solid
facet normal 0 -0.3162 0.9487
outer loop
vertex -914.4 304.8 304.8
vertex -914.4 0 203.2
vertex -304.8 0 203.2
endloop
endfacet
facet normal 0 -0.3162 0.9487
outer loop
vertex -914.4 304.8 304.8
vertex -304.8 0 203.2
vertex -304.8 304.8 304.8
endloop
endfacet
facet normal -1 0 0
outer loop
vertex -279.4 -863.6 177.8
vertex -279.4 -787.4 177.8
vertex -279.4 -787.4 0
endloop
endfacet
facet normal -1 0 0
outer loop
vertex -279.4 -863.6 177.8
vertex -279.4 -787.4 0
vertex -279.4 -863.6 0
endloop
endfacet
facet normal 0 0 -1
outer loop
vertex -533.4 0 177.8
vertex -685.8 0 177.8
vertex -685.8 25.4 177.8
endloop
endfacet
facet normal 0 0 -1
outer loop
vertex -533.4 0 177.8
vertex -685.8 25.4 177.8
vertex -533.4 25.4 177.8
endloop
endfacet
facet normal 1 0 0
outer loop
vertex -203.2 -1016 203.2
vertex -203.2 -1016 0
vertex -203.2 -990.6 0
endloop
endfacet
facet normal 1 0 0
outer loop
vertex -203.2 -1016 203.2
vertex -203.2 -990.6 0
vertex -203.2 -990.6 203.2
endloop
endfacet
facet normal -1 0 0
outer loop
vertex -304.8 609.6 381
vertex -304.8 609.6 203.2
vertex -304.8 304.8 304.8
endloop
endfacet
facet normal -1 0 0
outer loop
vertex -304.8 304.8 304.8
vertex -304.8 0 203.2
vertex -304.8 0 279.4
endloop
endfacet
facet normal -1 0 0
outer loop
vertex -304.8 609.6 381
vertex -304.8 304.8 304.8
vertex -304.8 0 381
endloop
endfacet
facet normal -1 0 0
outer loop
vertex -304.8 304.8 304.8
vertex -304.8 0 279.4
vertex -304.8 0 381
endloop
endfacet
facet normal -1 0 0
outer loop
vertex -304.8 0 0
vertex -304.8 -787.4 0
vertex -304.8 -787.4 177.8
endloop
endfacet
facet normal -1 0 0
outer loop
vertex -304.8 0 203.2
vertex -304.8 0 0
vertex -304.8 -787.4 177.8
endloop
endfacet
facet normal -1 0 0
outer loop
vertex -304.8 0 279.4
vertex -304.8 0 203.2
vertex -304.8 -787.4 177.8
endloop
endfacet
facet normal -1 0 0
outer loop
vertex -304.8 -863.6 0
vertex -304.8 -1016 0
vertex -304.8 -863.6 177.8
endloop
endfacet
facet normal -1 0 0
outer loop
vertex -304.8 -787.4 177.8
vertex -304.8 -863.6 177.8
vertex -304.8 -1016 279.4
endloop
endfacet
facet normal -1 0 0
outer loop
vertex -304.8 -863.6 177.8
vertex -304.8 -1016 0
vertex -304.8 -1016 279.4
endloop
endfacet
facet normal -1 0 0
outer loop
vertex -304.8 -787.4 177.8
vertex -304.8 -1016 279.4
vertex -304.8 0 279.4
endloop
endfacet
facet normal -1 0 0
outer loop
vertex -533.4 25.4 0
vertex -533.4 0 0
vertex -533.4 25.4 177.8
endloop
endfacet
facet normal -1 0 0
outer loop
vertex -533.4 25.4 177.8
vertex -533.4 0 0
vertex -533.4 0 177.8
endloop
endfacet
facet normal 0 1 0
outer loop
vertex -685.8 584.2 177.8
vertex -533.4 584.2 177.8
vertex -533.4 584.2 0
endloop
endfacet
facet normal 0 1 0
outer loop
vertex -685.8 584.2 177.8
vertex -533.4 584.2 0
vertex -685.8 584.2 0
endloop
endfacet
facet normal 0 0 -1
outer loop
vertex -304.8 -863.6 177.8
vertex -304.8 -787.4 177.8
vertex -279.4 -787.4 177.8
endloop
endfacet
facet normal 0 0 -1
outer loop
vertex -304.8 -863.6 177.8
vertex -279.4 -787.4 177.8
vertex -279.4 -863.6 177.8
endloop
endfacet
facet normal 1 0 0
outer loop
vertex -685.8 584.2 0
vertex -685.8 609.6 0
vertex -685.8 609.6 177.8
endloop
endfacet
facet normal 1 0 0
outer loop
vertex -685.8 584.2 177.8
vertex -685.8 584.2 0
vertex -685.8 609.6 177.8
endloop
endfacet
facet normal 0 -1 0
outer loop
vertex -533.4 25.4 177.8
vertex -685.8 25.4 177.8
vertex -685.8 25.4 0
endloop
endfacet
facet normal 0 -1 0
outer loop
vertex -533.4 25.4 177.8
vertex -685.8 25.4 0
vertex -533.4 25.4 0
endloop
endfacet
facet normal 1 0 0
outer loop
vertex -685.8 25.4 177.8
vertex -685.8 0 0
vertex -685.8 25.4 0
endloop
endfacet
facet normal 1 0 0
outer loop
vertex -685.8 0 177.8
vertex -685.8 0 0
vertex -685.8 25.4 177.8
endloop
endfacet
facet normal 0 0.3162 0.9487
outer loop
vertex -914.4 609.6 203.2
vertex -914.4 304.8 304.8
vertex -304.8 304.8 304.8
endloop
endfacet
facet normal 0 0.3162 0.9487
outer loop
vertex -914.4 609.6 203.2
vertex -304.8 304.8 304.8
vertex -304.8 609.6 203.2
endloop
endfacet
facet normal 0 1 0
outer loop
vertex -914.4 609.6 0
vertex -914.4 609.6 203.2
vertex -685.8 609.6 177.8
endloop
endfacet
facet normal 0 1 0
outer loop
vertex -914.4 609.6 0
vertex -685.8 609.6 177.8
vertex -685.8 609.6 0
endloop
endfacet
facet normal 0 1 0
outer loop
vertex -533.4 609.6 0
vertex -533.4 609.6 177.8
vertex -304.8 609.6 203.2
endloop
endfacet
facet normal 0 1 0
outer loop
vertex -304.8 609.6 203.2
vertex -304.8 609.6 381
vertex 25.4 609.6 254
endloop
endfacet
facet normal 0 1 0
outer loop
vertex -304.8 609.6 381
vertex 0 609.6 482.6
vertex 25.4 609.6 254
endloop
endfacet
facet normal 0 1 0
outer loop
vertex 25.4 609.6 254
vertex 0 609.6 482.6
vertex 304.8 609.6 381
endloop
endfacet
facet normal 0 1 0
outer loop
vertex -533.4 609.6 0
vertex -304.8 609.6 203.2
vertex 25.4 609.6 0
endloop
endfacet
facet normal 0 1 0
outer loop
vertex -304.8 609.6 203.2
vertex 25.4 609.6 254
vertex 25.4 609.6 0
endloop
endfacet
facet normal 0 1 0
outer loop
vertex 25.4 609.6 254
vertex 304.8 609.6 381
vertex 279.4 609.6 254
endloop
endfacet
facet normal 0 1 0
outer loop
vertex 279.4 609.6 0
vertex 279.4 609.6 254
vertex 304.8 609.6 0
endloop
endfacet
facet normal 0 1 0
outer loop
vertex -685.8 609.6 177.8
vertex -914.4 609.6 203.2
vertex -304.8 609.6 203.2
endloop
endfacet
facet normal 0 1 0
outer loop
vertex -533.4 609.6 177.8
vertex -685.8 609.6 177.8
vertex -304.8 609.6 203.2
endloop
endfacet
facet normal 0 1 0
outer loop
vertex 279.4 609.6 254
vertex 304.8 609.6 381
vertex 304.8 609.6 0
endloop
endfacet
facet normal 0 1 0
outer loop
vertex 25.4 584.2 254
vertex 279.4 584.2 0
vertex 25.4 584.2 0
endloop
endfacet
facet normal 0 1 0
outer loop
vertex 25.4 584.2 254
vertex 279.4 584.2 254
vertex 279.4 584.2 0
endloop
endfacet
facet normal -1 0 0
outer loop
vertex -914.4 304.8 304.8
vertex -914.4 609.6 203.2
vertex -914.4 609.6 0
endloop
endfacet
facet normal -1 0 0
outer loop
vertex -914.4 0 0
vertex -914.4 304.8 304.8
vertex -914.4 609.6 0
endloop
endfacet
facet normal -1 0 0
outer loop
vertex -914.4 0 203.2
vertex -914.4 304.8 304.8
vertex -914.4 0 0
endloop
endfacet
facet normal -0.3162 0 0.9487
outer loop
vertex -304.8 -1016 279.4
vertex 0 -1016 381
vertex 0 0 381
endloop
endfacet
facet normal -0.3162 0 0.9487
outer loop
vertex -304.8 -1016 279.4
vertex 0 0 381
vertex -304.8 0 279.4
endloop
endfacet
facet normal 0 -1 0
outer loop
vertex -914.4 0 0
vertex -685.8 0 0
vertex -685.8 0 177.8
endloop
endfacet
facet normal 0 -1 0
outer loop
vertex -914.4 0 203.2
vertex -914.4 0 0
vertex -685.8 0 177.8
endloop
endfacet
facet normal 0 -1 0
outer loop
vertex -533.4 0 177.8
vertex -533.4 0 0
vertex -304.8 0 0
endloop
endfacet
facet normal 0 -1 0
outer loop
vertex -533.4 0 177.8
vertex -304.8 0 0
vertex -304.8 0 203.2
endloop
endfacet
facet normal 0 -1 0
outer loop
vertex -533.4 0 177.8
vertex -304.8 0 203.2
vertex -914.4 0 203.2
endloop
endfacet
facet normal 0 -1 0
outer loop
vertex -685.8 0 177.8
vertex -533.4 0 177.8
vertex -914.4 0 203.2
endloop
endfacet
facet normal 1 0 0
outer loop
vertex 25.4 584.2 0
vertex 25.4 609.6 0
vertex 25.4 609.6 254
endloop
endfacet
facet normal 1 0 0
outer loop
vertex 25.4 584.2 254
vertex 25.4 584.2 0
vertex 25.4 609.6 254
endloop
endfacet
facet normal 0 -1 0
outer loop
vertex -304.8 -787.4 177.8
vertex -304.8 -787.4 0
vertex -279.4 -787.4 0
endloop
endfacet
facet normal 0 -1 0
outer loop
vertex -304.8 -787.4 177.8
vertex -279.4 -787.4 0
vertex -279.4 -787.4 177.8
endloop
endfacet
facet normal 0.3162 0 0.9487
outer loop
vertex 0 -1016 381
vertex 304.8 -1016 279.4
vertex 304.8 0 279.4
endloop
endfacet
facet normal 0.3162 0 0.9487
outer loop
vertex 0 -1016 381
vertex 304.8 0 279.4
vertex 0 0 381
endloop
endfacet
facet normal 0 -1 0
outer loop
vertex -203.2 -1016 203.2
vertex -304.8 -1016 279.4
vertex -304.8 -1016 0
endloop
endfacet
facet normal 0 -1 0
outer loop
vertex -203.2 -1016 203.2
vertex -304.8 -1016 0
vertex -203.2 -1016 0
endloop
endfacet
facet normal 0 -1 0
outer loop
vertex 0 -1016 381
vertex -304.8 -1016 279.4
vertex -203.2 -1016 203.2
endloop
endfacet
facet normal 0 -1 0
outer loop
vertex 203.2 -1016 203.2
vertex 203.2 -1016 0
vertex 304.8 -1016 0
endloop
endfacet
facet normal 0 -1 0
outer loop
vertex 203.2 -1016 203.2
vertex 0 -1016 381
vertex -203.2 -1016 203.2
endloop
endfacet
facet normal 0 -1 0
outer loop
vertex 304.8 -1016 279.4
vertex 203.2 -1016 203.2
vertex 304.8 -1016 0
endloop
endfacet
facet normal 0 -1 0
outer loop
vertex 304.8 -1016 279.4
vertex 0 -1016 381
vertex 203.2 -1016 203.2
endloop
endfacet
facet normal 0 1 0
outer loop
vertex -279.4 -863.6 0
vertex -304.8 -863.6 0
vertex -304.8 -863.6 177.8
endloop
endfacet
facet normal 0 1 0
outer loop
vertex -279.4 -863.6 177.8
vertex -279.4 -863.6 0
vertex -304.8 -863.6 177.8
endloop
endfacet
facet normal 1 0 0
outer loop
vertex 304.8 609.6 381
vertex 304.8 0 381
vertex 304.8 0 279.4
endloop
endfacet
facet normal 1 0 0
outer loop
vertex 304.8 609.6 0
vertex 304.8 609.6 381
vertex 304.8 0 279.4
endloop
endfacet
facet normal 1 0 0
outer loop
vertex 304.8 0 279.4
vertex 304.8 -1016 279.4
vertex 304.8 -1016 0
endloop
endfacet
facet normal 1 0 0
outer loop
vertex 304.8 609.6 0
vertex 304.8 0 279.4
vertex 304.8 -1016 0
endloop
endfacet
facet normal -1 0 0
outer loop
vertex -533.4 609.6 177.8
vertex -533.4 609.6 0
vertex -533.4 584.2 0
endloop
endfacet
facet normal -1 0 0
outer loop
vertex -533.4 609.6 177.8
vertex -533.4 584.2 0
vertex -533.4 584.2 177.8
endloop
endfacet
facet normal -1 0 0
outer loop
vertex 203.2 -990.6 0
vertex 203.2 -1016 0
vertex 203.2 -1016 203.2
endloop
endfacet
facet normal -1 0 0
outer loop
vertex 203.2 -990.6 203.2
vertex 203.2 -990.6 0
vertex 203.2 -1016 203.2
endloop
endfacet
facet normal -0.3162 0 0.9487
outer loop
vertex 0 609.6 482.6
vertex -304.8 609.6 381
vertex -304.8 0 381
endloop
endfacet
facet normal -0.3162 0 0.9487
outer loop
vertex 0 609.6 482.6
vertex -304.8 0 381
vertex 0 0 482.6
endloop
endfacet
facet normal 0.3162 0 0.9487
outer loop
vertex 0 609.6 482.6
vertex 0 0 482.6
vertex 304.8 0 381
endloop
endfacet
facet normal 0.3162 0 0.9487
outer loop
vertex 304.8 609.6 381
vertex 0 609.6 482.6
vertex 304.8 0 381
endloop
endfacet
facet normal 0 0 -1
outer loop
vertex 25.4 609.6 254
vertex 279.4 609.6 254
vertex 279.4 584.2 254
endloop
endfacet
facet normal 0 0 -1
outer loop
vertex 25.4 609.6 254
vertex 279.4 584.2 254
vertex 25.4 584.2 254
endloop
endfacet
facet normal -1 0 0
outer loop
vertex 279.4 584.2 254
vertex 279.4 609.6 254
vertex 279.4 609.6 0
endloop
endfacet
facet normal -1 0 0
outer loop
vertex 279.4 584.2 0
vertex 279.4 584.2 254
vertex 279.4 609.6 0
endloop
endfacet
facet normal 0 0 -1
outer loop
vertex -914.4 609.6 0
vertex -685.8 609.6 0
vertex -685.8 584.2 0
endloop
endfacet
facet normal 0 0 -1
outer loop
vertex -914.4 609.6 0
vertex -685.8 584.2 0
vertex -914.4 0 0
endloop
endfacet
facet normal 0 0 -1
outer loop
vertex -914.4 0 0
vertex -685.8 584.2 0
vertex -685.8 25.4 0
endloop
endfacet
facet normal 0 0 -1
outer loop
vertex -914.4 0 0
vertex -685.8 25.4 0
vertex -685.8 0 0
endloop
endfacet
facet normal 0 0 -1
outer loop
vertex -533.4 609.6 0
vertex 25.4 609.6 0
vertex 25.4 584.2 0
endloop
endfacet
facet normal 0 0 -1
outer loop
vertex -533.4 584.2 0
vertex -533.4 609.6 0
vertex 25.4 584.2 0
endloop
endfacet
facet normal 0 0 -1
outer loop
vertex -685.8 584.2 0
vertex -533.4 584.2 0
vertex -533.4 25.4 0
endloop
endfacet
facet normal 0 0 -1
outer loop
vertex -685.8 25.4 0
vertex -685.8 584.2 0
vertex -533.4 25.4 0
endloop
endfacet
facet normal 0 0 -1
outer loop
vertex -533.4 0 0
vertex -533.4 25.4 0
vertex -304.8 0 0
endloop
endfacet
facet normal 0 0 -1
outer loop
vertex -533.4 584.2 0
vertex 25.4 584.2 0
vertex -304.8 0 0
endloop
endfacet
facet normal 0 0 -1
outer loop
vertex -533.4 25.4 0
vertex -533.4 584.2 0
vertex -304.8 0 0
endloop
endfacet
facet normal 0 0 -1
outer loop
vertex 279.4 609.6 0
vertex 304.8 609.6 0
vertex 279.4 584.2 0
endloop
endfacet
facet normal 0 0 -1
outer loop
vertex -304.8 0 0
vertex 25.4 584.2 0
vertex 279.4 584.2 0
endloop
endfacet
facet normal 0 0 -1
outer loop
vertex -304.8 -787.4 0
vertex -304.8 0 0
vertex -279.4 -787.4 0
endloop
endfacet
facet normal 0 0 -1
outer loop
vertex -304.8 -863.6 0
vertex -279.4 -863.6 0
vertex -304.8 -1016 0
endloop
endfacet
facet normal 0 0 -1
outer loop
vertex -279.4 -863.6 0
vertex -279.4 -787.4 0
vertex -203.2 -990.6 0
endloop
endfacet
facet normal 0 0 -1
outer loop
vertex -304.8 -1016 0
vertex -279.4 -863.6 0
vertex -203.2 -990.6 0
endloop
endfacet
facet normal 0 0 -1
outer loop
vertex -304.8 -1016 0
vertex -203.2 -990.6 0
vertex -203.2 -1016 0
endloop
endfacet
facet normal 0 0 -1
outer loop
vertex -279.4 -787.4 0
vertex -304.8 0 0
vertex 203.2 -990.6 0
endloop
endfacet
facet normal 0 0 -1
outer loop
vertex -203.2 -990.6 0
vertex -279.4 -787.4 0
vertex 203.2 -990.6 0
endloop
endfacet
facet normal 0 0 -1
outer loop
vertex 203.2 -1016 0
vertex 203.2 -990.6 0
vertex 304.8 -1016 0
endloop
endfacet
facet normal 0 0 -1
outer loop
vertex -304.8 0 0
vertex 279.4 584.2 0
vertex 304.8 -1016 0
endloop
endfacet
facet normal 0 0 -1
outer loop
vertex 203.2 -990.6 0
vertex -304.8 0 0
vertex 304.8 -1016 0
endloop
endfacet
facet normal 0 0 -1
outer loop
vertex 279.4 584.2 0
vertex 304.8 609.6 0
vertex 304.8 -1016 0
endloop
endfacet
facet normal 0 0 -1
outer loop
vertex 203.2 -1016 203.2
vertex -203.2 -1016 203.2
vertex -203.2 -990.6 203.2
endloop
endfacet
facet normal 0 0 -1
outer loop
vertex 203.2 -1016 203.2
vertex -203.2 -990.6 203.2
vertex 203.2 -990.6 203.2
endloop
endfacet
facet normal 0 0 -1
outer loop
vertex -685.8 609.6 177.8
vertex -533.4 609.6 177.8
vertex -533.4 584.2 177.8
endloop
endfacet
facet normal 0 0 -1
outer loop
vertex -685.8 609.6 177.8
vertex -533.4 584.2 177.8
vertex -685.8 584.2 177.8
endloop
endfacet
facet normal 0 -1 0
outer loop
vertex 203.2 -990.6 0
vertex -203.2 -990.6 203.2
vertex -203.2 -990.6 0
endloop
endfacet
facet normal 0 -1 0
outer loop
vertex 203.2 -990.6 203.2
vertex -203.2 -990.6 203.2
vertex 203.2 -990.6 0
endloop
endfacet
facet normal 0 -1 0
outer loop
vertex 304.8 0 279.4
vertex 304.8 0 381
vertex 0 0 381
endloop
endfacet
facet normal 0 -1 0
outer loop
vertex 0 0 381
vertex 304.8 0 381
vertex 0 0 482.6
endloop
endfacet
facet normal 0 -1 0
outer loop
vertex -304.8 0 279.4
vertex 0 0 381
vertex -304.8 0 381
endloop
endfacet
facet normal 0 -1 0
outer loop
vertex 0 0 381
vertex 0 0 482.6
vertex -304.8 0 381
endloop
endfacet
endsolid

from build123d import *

# Parameters (mm, degrees)
F1_DEPTH  = 1016
F3_DEPTH  = 609.6
F5_DEPTH  = 609.6
F6_W      = 152.4
F6_H      = 177.8
F7_DEPTH  = 25.4
F8_W      = 406.4
F8_H      = 203.2
F9_DEPTH  = 25.4
F10_W     = 254
F10_H     = 203.2
F10_H_2   = 50.8
F10_W_2   = 152.4
F10_H_3   = 177.8
F11_DEPTH = 25.4
F12_W     = 76.2
F12_H     = 177.8
F13_DEPTH = 25.4


with BuildPart() as f1:
    # F0 (on Front) → F1 (new body)
    with BuildSketch(Plane.XZ):
        Polygon((-304.8, 0), (0, 0), (304.8, 0), (304.8, 279.4), (0, 381), (-304.8, 279.4), align=None)
    extrude(amount=F1_DEPTH)

    # F2 (on face) → F3 (join)
    with BuildSketch(Plane(origin=(0, 0, 0), x_dir=(-1, 0, 0), z_dir=(0, 1, 0))):
        Polygon((-304.8, 381), (-304.8, 0), (304.8, 0), (304.8, 381), (0, 482.6), align=None)
    extrude(amount=F3_DEPTH)

    # F4 (on face) → F5 (join)
    with BuildSketch(Plane(origin=(-304.8, 0, 0), x_dir=(0, -1, 0), z_dir=(-1, 0, 0))):
        Polygon((-609.6, 203.2), (-609.6, 0), (-304.8, 0), (-304.8, 304.8), align=None)
        Polygon((-304.8, 304.8), (-304.8, 0), (0, 0), (0, 203.2), align=None)
    extrude(amount=F5_DEPTH)

    # F6 (on face) → F7 (cut)
    with BuildSketch(Plane.XZ):
        with Locations((-609.6, 88.9)):
            Rectangle(F6_W, F6_H)
    extrude(amount=-F7_DEPTH, mode=Mode.SUBTRACT)

    # F8 (on face) → F9 (cut)
    with BuildSketch(Plane.XZ.offset(1016)):
        with Locations((0, 101.6)):
            Rectangle(F8_W, F8_H)
    extrude(amount=-F9_DEPTH, mode=Mode.SUBTRACT)

    # F10 (on face) → F11 (cut)
    with BuildSketch(Plane(origin=(0, 609.6, 0), x_dir=(-1, 0, 0), z_dir=(0, 1, 0))):
        with Locations((-152.4, 101.6)):
            Rectangle(F10_W, F10_H)
        with Locations((-152.4, 228.6)):
            Rectangle(F10_W, F10_H_2)
        with Locations((609.6, 88.9)):
            Rectangle(F10_W_2, F10_H_3)
    extrude(amount=-F11_DEPTH, mode=Mode.SUBTRACT)

    # F12 (on face) → F13 (cut)
    with BuildSketch(Plane(origin=(-304.8, 0, 0), x_dir=(0, -1, 0), z_dir=(-1, 0, 0))):
        with Locations((825.5, 88.9)):
            Rectangle(F12_W, F12_H)
    extrude(amount=-F13_DEPTH, mode=Mode.SUBTRACT)


solid = f1.part
